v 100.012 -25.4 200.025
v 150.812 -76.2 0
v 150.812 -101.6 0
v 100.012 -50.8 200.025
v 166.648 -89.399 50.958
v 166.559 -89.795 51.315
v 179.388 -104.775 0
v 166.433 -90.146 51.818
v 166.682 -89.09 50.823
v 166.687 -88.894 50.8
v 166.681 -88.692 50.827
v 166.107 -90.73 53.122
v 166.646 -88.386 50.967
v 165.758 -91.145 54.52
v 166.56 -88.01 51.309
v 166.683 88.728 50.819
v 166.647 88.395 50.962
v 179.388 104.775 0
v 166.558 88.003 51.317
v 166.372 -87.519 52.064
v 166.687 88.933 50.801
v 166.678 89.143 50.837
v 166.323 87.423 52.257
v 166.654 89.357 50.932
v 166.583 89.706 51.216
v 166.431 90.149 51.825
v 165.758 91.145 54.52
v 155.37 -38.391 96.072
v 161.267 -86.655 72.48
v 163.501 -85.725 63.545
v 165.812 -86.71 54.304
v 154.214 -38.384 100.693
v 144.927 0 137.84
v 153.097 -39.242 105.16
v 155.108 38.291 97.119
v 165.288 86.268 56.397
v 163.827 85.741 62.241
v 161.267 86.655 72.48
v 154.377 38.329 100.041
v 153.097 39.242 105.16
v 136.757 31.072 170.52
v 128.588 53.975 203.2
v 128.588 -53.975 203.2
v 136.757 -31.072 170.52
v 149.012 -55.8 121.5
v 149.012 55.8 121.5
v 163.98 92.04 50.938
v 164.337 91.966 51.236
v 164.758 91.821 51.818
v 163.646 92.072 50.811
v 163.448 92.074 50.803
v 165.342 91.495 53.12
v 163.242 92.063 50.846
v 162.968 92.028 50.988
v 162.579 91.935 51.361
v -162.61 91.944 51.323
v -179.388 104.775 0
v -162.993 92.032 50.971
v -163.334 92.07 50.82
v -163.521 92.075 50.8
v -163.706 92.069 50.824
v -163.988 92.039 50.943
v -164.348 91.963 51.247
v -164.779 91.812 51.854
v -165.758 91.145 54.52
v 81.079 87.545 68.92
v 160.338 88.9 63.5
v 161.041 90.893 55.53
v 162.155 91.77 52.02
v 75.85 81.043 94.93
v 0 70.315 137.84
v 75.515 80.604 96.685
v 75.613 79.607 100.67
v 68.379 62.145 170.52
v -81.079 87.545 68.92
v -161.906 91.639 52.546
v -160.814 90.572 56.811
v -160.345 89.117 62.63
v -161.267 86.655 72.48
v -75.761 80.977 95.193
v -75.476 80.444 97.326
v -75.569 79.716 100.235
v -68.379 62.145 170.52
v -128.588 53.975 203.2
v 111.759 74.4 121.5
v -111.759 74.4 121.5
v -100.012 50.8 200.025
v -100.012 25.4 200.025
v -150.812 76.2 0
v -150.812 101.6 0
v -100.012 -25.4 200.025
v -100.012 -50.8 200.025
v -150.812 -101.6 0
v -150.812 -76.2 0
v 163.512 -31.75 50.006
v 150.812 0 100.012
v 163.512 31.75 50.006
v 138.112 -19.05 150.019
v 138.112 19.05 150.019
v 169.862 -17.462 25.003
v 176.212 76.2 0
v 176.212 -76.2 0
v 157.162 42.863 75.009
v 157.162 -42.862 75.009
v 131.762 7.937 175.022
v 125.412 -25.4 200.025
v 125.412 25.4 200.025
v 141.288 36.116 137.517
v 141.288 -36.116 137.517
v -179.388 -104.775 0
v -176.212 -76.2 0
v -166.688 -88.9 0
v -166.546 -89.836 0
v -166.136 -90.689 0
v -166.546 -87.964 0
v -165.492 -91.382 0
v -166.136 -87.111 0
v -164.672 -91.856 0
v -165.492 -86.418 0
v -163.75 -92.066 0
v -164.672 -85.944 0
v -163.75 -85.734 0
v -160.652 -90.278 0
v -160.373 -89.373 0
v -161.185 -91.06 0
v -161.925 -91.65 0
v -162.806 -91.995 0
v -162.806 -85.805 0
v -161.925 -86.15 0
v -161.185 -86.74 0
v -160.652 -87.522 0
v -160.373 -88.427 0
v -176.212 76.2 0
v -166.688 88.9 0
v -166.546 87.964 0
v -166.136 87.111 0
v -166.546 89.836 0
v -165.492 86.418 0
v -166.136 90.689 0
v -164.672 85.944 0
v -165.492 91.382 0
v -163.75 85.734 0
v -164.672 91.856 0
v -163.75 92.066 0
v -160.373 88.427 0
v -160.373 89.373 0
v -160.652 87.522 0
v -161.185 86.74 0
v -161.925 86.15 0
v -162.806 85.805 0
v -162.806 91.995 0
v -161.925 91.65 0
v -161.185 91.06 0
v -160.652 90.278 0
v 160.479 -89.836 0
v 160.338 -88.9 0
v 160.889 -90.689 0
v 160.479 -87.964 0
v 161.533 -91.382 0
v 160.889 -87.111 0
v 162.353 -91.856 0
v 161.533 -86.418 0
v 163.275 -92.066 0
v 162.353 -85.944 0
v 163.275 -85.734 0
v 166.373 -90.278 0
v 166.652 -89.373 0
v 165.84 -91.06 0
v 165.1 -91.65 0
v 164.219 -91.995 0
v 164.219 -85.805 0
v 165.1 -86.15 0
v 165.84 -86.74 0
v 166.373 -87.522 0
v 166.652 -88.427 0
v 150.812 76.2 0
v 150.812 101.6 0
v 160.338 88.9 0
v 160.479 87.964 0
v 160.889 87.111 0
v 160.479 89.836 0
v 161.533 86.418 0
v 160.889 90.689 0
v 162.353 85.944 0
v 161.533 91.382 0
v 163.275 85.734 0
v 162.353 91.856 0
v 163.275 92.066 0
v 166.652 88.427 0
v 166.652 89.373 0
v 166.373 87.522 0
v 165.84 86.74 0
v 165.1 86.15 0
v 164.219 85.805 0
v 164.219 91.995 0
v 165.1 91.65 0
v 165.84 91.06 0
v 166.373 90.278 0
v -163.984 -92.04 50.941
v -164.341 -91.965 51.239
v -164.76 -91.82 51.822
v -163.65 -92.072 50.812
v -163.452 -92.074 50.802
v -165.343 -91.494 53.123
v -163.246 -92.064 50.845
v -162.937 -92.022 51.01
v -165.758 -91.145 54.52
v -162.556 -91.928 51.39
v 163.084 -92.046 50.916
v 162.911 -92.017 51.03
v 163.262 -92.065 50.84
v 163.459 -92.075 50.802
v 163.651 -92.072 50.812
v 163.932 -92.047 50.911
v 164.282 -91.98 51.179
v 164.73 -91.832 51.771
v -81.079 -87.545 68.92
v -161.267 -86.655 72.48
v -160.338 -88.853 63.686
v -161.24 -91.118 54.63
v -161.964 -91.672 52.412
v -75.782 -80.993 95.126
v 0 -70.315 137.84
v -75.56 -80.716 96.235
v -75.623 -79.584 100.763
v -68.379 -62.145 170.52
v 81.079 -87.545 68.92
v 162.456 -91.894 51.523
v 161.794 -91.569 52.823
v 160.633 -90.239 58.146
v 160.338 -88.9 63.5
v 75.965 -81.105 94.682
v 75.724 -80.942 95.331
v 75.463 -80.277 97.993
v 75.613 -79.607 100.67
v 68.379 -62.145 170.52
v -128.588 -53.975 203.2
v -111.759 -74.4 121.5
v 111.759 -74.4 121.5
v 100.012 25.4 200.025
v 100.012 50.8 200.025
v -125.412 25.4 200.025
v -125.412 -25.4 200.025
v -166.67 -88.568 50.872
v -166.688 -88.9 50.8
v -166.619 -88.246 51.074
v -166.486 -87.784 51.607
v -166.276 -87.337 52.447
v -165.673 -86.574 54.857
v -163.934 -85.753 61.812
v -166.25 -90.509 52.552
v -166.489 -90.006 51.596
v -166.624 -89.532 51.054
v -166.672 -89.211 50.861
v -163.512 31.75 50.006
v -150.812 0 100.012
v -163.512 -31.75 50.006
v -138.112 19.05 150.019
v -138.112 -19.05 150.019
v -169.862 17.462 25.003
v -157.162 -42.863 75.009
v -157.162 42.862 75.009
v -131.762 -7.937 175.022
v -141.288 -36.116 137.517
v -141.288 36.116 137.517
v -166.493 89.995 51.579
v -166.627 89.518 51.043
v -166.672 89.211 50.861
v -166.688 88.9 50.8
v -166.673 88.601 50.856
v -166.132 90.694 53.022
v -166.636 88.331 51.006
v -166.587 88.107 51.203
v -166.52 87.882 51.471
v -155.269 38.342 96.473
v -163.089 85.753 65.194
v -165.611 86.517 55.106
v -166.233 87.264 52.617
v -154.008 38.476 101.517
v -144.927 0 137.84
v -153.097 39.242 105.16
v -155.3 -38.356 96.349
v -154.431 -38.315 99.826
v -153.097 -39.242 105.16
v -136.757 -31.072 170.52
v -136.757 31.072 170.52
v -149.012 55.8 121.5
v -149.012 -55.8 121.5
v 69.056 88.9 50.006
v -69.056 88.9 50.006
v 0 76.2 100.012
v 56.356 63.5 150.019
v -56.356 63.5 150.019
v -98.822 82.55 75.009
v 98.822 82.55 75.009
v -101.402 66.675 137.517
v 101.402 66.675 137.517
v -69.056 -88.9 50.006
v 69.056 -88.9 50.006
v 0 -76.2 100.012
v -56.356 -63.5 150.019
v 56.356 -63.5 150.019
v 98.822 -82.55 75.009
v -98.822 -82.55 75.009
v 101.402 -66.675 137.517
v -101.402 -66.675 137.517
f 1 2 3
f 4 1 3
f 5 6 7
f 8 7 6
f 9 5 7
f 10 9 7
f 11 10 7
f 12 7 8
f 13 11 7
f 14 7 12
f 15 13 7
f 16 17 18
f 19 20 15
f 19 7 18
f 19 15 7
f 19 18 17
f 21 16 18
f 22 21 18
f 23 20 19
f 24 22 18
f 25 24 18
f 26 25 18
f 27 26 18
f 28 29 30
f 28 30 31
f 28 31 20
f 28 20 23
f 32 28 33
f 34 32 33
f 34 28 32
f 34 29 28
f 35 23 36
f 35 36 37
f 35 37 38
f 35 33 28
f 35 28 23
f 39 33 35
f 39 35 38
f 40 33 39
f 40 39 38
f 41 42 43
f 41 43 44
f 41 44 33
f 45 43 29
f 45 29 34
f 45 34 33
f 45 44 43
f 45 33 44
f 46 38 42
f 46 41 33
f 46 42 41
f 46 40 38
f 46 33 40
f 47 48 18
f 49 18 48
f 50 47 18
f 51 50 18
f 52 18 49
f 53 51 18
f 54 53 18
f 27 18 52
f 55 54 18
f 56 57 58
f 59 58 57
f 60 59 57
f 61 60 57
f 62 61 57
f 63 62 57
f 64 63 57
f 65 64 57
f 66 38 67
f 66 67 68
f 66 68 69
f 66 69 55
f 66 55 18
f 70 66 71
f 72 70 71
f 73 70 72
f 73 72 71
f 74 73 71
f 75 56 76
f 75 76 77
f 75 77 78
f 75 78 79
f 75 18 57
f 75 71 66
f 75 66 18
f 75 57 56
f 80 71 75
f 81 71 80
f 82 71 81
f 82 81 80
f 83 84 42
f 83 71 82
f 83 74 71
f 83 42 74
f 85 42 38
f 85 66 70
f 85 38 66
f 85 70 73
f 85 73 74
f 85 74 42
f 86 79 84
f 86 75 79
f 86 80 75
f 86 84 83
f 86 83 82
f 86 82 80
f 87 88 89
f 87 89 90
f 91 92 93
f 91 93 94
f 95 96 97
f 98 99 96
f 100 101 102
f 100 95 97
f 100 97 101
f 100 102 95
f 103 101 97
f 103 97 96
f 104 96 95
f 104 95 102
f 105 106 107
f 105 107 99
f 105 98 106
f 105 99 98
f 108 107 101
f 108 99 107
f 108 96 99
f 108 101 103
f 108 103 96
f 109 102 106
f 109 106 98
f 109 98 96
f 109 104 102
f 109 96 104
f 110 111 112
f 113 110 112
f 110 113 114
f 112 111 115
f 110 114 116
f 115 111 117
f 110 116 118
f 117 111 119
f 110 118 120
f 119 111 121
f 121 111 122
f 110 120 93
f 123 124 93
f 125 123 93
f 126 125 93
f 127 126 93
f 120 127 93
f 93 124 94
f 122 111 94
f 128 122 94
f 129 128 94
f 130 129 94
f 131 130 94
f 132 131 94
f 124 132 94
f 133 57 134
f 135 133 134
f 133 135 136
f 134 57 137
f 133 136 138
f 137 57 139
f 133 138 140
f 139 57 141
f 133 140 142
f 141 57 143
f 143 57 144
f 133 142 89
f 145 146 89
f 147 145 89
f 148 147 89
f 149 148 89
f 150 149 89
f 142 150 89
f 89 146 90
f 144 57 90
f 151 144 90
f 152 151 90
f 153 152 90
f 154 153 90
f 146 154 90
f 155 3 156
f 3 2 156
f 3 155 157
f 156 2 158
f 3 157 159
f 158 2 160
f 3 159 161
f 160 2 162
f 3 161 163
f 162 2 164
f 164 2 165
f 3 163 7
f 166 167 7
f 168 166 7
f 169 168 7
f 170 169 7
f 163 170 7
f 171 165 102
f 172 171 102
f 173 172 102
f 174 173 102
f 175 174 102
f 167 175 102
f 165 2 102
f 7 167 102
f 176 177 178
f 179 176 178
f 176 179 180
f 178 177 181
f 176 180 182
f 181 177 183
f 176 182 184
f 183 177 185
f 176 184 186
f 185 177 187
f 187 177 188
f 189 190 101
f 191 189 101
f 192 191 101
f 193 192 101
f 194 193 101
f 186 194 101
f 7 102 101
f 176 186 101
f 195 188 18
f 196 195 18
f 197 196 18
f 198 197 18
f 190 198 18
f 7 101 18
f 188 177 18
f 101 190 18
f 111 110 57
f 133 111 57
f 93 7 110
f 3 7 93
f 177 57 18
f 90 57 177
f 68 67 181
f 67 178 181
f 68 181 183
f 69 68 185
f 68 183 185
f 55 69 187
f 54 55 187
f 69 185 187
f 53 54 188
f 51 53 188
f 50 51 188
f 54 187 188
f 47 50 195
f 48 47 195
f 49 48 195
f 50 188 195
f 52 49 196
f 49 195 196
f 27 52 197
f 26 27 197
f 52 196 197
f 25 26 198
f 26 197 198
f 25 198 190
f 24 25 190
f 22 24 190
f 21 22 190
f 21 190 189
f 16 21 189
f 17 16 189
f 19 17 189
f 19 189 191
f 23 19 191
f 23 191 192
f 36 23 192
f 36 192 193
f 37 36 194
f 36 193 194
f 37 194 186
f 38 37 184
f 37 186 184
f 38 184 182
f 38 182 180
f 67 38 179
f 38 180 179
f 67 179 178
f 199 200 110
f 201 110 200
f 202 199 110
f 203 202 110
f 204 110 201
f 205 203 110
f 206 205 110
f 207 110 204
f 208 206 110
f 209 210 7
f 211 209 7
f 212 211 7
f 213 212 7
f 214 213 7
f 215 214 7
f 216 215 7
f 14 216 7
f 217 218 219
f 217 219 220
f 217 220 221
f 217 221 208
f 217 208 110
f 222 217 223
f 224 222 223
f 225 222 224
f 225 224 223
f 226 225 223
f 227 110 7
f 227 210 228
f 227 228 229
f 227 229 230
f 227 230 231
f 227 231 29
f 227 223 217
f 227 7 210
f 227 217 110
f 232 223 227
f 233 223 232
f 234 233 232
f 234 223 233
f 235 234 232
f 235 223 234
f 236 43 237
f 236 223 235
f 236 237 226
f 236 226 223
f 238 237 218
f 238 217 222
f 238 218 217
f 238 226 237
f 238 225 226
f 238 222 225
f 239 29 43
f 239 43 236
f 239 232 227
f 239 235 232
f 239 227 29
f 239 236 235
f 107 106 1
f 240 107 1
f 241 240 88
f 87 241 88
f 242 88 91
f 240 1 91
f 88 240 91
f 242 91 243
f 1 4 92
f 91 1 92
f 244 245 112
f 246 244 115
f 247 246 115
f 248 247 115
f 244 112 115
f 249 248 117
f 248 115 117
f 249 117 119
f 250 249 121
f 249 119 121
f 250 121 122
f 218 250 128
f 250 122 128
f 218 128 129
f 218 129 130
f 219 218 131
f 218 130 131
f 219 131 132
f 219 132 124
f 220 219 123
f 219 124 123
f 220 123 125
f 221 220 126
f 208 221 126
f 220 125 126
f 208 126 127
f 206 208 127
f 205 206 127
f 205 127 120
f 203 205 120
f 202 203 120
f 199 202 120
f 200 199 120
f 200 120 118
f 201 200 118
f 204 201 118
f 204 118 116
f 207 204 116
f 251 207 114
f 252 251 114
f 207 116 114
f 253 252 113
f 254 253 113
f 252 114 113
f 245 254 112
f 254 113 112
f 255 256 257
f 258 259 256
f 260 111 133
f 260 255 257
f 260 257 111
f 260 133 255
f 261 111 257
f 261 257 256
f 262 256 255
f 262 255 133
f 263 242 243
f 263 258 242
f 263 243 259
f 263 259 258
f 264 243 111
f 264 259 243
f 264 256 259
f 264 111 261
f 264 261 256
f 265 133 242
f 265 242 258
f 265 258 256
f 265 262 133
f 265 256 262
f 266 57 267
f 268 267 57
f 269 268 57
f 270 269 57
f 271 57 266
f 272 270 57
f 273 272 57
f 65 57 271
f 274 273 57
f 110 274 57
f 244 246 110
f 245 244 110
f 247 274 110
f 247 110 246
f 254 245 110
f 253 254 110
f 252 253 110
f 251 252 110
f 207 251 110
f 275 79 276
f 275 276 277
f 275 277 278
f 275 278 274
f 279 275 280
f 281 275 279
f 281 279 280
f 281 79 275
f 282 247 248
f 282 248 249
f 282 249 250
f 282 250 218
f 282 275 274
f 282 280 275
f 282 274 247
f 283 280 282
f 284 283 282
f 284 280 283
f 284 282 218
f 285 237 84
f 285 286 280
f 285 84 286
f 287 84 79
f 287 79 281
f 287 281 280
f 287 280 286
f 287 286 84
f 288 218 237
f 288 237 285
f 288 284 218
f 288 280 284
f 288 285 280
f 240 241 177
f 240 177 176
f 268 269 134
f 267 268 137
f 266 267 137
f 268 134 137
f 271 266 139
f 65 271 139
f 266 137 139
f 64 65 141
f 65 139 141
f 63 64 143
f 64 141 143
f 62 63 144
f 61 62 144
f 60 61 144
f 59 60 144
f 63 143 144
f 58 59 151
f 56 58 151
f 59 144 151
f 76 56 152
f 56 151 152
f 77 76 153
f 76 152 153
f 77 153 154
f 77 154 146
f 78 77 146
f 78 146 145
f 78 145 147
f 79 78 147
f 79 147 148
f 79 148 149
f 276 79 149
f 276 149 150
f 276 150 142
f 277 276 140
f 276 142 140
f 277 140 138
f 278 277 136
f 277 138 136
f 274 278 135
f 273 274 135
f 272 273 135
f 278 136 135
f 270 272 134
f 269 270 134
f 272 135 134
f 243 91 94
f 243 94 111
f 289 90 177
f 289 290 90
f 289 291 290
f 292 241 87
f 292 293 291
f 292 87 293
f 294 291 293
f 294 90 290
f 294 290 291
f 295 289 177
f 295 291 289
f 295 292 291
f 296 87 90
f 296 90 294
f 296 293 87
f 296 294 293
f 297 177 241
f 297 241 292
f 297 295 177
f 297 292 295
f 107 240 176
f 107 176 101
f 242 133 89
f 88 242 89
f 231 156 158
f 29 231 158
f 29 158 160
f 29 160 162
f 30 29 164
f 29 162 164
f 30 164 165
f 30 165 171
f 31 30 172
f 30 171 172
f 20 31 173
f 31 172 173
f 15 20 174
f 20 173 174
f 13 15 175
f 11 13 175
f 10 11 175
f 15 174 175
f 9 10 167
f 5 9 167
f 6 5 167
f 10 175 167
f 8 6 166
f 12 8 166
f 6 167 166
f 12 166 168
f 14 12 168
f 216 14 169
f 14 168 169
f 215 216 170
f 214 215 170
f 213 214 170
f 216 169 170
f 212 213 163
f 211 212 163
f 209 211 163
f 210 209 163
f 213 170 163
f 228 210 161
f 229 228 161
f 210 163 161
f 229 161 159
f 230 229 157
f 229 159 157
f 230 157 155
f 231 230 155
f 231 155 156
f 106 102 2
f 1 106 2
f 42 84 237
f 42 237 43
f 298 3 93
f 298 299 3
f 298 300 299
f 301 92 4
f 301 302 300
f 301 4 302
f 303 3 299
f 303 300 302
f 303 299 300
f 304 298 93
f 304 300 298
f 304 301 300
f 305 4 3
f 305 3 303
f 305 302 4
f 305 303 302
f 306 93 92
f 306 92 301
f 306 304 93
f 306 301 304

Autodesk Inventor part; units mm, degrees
ref_plane "YZ Plane" through (0, 0, 0) normal (1, 0, 0) x (0, 1, 0)
sketch "Sketch1" plane through (0, 0, 0) normal (0, 0, 1) x (1, 0, 0)
  line L0 (-251.1425, 0) -> (251.1425, 0) construction
  line L1 (0, -146.685) -> (0, 146.685) construction
  line L2 (-179.3875, 104.775) -> (179.3875, 104.775)
  line L3 (179.3875, 104.775) -> (179.3875, -104.775)
  line L4 (179.3875, -104.775) -> (-179.3875, -104.775)
  line L5 (-179.3875, -104.775) -> (-179.3875, 104.775)
  point P0 (0, 0)
  point P1 (0, 104.775)
  point P2 (-179.3875, 0)
  dimension "d0" = 358.775
  dimension "d1" = 209.55
ref_plane "Work Plane1" through (0, 0, 203.2) normal (0, 0, 1) x (1, 0, 0)
sketch "Sketch2" plane through (0, 0, 203.2) normal (0, 0, 1) x (1, 0, 0)
  line L0 (0, -146.685) -> (0, 146.685) construction
  line L1 (-253.365, 0) -> (253.365, 0) construction
  line L2 (-128.5875, 53.975) -> (128.5875, 53.975)
  line L3 (128.5875, 53.975) -> (128.5875, -53.975)
  line L4 (128.5875, -53.975) -> (-128.5875, -53.975)
  line L5 (-128.5875, -53.975) -> (-128.5875, 53.975)
  line L6 (-179.3875, 104.775) -> (179.3875, 104.775) construction
  line L7 (-179.3875, -104.775) -> (-179.3875, 104.775) construction
  point P0 (0, 0)
  point P1 (0, 53.975)
  point P2 (-128.5875, 0)
  dimension "d3" = 50.8
  dimension "d4" = 50.8
loft "Loft1" add profiles "Sketch1", "Sketch2"
sketch "Sketch3" plane through (179.3875, 104.775, 0) normal (0, 0, -1) x (-1, 0, 0)
  line L0 (179.3875, -251.46) -> (179.3875, 41.91) construction
  line L1 (430.53, -104.775) -> (-71.755, -104.775) construction
  line L2 (3.175, -3.175) -> (28.575, -3.175) construction
  line L3 (355.6, -3.175) -> (355.6, -28.575) construction
  line L4 (355.6, -206.375) -> (330.2, -206.375) construction
  line L5 (3.175, -206.375) -> (3.175, -180.975) construction
  line L6 (28.575, -3.175) -> (28.575, -28.575)
  line L7 (28.575, -28.575) -> (3.175, -28.575)
  line L8 (3.175, -180.975) -> (28.575, -180.975)
  line L9 (28.575, -180.975) -> (28.575, -206.375)
  line L10 (330.2, -3.175) -> (330.2, -28.575)
  line L11 (330.2, -28.575) -> (355.6, -28.575)
  line L12 (330.2, -206.375) -> (330.2, -180.975)
  line L13 (330.2, -180.975) -> (355.6, -180.975)
  line L14 (3.175, -28.575) -> (3.175, -3.175) construction
  line L15 (28.575, -3.175) -> (330.2, -3.175)
  line L16 (330.2, -3.175) -> (355.6, -3.175) construction
  line L17 (355.6, -28.575) -> (355.6, -180.975)
  line L18 (355.6, -180.975) -> (355.6, -206.375) construction
  line L19 (330.2, -206.375) -> (28.575, -206.375)
  line L20 (28.575, -206.375) -> (3.175, -206.375) construction
  line L21 (3.175, -180.975) -> (3.175, -28.575)
  line L22 (0, 0) -> (0, -209.55) construction
  line L23 (358.775, 0) -> (0, 0) construction
  point P0 (179.3875, -104.775)
  point P1 (179.3875, -3.175)
  point P2 (3.175, -104.775)
  dimension "d9" = 3.175
  dimension "d10" = 3.175
  dimension "d11" = 25.4
ref_plane "Work Plane2" through (0, 0, 200.025) normal (0, 0, 1) x (1, 0, 0)
sketch "Sketch5" plane through (0, 0, 200.025) normal (0, 0, 1) x (1, 0, 0)
  line L0 (150.8125, 101.6) -> (150.8125, 76.2) projected
  line L1 (150.8125, 76.2) -> (176.2125, 76.2) projected
  line L2 (176.2125, -76.2) -> (176.2125, 76.2) projected
  line L3 (176.2125, -76.2) -> (150.8125, -76.2) projected
  line L4 (150.8125, -76.2) -> (150.8125, -101.6) projected
  line L5 (-150.8125, -101.6) -> (150.8125, -101.6) projected
  line L6 (-150.8125, -101.6) -> (-150.8125, -76.2) projected
  line L7 (-150.8125, -76.2) -> (-176.2125, -76.2) projected
  line L8 (-176.2125, 76.2) -> (-176.2125, -76.2) projected
  line L9 (-150.8125, 76.2) -> (-176.2125, 76.2) projected
  line L10 (-150.8125, 101.6) -> (-150.8125, 76.2) projected
  line L11 (150.8125, 101.6) -> (-150.8125, 101.6) projected
  line L12 (-100.0125, 50.8) -> (-100.0125, 25.4)
  line L13 (-100.0125, 25.4) -> (-125.4125, 25.4)
  line L14 (-125.4125, 25.4) -> (-125.4125, -25.4)
  line L15 (-125.4125, -25.4) -> (-100.0125, -25.4)
  line L16 (-100.0125, -25.4) -> (-100.0125, -50.8)
  line L17 (-100.0125, -50.8) -> (100.0125, -50.8)
  line L18 (100.0125, -50.8) -> (100.0125, -25.4)
  line L19 (100.0125, -25.4) -> (125.4125, -25.4)
  line L20 (125.4125, -25.4) -> (125.4125, 25.4)
  line L21 (125.4125, 25.4) -> (100.0125, 25.4)
  line L22 (100.0125, 25.4) -> (100.0125, 50.8)
  line L23 (100.0125, 50.8) -> (-100.0125, 50.8)
  line L24 (-128.5875, 53.975) -> (128.5875, 53.975) projected
  point P0 (0, 0)
  dimension "d15" = 3.175
loft "Loft2" cut profiles "Sketch3", "Sketch5" contours all / L23 L22 L21 L20 L19 L18 L17 L16 L15 L14 L13 L12
sketch "Sketch6" plane through (179.3875, 104.775, 0) normal (0, 0, -1) x (-1, 0, 0)
  line L0 (430.53, -104.775) -> (-71.755, -104.775) construction
  line L1 (179.3875, -251.46) -> (179.3875, 41.91) construction
  line L2 (15.875, -15.875) -> (342.9, -15.875) construction
  line L3 (342.9, -15.875) -> (342.9, -193.675) construction
  line L4 (342.9, -193.675) -> (15.875, -193.675) construction
  line L5 (15.875, -193.675) -> (15.875, -15.875) construction
  line L6 (3.175, -28.575) -> (28.575, -28.575) construction
  line L7 (28.575, -28.575) -> (28.575, -3.175) construction
  circle A0 centre (15.875, -15.875) radius 3.175
  circle A1 centre (342.9, -15.875) radius 3.175
  circle A2 centre (342.9, -193.675) radius 3.175
  circle A3 centre (15.875, -193.675) radius 3.175
  point P0 (179.3875, -104.775)
  point P1 (179.3875, -15.875)
  point P2 (15.875, -104.775)
  dimension "d20" = 12.7
  dimension "d21" = 12.7
  dimension "d22" = 6.35
extrude "Extrusion1" cut sketch "Sketch6" against normal through all
equation "\"d21\" = d20"
properties part number "Front Cover"
